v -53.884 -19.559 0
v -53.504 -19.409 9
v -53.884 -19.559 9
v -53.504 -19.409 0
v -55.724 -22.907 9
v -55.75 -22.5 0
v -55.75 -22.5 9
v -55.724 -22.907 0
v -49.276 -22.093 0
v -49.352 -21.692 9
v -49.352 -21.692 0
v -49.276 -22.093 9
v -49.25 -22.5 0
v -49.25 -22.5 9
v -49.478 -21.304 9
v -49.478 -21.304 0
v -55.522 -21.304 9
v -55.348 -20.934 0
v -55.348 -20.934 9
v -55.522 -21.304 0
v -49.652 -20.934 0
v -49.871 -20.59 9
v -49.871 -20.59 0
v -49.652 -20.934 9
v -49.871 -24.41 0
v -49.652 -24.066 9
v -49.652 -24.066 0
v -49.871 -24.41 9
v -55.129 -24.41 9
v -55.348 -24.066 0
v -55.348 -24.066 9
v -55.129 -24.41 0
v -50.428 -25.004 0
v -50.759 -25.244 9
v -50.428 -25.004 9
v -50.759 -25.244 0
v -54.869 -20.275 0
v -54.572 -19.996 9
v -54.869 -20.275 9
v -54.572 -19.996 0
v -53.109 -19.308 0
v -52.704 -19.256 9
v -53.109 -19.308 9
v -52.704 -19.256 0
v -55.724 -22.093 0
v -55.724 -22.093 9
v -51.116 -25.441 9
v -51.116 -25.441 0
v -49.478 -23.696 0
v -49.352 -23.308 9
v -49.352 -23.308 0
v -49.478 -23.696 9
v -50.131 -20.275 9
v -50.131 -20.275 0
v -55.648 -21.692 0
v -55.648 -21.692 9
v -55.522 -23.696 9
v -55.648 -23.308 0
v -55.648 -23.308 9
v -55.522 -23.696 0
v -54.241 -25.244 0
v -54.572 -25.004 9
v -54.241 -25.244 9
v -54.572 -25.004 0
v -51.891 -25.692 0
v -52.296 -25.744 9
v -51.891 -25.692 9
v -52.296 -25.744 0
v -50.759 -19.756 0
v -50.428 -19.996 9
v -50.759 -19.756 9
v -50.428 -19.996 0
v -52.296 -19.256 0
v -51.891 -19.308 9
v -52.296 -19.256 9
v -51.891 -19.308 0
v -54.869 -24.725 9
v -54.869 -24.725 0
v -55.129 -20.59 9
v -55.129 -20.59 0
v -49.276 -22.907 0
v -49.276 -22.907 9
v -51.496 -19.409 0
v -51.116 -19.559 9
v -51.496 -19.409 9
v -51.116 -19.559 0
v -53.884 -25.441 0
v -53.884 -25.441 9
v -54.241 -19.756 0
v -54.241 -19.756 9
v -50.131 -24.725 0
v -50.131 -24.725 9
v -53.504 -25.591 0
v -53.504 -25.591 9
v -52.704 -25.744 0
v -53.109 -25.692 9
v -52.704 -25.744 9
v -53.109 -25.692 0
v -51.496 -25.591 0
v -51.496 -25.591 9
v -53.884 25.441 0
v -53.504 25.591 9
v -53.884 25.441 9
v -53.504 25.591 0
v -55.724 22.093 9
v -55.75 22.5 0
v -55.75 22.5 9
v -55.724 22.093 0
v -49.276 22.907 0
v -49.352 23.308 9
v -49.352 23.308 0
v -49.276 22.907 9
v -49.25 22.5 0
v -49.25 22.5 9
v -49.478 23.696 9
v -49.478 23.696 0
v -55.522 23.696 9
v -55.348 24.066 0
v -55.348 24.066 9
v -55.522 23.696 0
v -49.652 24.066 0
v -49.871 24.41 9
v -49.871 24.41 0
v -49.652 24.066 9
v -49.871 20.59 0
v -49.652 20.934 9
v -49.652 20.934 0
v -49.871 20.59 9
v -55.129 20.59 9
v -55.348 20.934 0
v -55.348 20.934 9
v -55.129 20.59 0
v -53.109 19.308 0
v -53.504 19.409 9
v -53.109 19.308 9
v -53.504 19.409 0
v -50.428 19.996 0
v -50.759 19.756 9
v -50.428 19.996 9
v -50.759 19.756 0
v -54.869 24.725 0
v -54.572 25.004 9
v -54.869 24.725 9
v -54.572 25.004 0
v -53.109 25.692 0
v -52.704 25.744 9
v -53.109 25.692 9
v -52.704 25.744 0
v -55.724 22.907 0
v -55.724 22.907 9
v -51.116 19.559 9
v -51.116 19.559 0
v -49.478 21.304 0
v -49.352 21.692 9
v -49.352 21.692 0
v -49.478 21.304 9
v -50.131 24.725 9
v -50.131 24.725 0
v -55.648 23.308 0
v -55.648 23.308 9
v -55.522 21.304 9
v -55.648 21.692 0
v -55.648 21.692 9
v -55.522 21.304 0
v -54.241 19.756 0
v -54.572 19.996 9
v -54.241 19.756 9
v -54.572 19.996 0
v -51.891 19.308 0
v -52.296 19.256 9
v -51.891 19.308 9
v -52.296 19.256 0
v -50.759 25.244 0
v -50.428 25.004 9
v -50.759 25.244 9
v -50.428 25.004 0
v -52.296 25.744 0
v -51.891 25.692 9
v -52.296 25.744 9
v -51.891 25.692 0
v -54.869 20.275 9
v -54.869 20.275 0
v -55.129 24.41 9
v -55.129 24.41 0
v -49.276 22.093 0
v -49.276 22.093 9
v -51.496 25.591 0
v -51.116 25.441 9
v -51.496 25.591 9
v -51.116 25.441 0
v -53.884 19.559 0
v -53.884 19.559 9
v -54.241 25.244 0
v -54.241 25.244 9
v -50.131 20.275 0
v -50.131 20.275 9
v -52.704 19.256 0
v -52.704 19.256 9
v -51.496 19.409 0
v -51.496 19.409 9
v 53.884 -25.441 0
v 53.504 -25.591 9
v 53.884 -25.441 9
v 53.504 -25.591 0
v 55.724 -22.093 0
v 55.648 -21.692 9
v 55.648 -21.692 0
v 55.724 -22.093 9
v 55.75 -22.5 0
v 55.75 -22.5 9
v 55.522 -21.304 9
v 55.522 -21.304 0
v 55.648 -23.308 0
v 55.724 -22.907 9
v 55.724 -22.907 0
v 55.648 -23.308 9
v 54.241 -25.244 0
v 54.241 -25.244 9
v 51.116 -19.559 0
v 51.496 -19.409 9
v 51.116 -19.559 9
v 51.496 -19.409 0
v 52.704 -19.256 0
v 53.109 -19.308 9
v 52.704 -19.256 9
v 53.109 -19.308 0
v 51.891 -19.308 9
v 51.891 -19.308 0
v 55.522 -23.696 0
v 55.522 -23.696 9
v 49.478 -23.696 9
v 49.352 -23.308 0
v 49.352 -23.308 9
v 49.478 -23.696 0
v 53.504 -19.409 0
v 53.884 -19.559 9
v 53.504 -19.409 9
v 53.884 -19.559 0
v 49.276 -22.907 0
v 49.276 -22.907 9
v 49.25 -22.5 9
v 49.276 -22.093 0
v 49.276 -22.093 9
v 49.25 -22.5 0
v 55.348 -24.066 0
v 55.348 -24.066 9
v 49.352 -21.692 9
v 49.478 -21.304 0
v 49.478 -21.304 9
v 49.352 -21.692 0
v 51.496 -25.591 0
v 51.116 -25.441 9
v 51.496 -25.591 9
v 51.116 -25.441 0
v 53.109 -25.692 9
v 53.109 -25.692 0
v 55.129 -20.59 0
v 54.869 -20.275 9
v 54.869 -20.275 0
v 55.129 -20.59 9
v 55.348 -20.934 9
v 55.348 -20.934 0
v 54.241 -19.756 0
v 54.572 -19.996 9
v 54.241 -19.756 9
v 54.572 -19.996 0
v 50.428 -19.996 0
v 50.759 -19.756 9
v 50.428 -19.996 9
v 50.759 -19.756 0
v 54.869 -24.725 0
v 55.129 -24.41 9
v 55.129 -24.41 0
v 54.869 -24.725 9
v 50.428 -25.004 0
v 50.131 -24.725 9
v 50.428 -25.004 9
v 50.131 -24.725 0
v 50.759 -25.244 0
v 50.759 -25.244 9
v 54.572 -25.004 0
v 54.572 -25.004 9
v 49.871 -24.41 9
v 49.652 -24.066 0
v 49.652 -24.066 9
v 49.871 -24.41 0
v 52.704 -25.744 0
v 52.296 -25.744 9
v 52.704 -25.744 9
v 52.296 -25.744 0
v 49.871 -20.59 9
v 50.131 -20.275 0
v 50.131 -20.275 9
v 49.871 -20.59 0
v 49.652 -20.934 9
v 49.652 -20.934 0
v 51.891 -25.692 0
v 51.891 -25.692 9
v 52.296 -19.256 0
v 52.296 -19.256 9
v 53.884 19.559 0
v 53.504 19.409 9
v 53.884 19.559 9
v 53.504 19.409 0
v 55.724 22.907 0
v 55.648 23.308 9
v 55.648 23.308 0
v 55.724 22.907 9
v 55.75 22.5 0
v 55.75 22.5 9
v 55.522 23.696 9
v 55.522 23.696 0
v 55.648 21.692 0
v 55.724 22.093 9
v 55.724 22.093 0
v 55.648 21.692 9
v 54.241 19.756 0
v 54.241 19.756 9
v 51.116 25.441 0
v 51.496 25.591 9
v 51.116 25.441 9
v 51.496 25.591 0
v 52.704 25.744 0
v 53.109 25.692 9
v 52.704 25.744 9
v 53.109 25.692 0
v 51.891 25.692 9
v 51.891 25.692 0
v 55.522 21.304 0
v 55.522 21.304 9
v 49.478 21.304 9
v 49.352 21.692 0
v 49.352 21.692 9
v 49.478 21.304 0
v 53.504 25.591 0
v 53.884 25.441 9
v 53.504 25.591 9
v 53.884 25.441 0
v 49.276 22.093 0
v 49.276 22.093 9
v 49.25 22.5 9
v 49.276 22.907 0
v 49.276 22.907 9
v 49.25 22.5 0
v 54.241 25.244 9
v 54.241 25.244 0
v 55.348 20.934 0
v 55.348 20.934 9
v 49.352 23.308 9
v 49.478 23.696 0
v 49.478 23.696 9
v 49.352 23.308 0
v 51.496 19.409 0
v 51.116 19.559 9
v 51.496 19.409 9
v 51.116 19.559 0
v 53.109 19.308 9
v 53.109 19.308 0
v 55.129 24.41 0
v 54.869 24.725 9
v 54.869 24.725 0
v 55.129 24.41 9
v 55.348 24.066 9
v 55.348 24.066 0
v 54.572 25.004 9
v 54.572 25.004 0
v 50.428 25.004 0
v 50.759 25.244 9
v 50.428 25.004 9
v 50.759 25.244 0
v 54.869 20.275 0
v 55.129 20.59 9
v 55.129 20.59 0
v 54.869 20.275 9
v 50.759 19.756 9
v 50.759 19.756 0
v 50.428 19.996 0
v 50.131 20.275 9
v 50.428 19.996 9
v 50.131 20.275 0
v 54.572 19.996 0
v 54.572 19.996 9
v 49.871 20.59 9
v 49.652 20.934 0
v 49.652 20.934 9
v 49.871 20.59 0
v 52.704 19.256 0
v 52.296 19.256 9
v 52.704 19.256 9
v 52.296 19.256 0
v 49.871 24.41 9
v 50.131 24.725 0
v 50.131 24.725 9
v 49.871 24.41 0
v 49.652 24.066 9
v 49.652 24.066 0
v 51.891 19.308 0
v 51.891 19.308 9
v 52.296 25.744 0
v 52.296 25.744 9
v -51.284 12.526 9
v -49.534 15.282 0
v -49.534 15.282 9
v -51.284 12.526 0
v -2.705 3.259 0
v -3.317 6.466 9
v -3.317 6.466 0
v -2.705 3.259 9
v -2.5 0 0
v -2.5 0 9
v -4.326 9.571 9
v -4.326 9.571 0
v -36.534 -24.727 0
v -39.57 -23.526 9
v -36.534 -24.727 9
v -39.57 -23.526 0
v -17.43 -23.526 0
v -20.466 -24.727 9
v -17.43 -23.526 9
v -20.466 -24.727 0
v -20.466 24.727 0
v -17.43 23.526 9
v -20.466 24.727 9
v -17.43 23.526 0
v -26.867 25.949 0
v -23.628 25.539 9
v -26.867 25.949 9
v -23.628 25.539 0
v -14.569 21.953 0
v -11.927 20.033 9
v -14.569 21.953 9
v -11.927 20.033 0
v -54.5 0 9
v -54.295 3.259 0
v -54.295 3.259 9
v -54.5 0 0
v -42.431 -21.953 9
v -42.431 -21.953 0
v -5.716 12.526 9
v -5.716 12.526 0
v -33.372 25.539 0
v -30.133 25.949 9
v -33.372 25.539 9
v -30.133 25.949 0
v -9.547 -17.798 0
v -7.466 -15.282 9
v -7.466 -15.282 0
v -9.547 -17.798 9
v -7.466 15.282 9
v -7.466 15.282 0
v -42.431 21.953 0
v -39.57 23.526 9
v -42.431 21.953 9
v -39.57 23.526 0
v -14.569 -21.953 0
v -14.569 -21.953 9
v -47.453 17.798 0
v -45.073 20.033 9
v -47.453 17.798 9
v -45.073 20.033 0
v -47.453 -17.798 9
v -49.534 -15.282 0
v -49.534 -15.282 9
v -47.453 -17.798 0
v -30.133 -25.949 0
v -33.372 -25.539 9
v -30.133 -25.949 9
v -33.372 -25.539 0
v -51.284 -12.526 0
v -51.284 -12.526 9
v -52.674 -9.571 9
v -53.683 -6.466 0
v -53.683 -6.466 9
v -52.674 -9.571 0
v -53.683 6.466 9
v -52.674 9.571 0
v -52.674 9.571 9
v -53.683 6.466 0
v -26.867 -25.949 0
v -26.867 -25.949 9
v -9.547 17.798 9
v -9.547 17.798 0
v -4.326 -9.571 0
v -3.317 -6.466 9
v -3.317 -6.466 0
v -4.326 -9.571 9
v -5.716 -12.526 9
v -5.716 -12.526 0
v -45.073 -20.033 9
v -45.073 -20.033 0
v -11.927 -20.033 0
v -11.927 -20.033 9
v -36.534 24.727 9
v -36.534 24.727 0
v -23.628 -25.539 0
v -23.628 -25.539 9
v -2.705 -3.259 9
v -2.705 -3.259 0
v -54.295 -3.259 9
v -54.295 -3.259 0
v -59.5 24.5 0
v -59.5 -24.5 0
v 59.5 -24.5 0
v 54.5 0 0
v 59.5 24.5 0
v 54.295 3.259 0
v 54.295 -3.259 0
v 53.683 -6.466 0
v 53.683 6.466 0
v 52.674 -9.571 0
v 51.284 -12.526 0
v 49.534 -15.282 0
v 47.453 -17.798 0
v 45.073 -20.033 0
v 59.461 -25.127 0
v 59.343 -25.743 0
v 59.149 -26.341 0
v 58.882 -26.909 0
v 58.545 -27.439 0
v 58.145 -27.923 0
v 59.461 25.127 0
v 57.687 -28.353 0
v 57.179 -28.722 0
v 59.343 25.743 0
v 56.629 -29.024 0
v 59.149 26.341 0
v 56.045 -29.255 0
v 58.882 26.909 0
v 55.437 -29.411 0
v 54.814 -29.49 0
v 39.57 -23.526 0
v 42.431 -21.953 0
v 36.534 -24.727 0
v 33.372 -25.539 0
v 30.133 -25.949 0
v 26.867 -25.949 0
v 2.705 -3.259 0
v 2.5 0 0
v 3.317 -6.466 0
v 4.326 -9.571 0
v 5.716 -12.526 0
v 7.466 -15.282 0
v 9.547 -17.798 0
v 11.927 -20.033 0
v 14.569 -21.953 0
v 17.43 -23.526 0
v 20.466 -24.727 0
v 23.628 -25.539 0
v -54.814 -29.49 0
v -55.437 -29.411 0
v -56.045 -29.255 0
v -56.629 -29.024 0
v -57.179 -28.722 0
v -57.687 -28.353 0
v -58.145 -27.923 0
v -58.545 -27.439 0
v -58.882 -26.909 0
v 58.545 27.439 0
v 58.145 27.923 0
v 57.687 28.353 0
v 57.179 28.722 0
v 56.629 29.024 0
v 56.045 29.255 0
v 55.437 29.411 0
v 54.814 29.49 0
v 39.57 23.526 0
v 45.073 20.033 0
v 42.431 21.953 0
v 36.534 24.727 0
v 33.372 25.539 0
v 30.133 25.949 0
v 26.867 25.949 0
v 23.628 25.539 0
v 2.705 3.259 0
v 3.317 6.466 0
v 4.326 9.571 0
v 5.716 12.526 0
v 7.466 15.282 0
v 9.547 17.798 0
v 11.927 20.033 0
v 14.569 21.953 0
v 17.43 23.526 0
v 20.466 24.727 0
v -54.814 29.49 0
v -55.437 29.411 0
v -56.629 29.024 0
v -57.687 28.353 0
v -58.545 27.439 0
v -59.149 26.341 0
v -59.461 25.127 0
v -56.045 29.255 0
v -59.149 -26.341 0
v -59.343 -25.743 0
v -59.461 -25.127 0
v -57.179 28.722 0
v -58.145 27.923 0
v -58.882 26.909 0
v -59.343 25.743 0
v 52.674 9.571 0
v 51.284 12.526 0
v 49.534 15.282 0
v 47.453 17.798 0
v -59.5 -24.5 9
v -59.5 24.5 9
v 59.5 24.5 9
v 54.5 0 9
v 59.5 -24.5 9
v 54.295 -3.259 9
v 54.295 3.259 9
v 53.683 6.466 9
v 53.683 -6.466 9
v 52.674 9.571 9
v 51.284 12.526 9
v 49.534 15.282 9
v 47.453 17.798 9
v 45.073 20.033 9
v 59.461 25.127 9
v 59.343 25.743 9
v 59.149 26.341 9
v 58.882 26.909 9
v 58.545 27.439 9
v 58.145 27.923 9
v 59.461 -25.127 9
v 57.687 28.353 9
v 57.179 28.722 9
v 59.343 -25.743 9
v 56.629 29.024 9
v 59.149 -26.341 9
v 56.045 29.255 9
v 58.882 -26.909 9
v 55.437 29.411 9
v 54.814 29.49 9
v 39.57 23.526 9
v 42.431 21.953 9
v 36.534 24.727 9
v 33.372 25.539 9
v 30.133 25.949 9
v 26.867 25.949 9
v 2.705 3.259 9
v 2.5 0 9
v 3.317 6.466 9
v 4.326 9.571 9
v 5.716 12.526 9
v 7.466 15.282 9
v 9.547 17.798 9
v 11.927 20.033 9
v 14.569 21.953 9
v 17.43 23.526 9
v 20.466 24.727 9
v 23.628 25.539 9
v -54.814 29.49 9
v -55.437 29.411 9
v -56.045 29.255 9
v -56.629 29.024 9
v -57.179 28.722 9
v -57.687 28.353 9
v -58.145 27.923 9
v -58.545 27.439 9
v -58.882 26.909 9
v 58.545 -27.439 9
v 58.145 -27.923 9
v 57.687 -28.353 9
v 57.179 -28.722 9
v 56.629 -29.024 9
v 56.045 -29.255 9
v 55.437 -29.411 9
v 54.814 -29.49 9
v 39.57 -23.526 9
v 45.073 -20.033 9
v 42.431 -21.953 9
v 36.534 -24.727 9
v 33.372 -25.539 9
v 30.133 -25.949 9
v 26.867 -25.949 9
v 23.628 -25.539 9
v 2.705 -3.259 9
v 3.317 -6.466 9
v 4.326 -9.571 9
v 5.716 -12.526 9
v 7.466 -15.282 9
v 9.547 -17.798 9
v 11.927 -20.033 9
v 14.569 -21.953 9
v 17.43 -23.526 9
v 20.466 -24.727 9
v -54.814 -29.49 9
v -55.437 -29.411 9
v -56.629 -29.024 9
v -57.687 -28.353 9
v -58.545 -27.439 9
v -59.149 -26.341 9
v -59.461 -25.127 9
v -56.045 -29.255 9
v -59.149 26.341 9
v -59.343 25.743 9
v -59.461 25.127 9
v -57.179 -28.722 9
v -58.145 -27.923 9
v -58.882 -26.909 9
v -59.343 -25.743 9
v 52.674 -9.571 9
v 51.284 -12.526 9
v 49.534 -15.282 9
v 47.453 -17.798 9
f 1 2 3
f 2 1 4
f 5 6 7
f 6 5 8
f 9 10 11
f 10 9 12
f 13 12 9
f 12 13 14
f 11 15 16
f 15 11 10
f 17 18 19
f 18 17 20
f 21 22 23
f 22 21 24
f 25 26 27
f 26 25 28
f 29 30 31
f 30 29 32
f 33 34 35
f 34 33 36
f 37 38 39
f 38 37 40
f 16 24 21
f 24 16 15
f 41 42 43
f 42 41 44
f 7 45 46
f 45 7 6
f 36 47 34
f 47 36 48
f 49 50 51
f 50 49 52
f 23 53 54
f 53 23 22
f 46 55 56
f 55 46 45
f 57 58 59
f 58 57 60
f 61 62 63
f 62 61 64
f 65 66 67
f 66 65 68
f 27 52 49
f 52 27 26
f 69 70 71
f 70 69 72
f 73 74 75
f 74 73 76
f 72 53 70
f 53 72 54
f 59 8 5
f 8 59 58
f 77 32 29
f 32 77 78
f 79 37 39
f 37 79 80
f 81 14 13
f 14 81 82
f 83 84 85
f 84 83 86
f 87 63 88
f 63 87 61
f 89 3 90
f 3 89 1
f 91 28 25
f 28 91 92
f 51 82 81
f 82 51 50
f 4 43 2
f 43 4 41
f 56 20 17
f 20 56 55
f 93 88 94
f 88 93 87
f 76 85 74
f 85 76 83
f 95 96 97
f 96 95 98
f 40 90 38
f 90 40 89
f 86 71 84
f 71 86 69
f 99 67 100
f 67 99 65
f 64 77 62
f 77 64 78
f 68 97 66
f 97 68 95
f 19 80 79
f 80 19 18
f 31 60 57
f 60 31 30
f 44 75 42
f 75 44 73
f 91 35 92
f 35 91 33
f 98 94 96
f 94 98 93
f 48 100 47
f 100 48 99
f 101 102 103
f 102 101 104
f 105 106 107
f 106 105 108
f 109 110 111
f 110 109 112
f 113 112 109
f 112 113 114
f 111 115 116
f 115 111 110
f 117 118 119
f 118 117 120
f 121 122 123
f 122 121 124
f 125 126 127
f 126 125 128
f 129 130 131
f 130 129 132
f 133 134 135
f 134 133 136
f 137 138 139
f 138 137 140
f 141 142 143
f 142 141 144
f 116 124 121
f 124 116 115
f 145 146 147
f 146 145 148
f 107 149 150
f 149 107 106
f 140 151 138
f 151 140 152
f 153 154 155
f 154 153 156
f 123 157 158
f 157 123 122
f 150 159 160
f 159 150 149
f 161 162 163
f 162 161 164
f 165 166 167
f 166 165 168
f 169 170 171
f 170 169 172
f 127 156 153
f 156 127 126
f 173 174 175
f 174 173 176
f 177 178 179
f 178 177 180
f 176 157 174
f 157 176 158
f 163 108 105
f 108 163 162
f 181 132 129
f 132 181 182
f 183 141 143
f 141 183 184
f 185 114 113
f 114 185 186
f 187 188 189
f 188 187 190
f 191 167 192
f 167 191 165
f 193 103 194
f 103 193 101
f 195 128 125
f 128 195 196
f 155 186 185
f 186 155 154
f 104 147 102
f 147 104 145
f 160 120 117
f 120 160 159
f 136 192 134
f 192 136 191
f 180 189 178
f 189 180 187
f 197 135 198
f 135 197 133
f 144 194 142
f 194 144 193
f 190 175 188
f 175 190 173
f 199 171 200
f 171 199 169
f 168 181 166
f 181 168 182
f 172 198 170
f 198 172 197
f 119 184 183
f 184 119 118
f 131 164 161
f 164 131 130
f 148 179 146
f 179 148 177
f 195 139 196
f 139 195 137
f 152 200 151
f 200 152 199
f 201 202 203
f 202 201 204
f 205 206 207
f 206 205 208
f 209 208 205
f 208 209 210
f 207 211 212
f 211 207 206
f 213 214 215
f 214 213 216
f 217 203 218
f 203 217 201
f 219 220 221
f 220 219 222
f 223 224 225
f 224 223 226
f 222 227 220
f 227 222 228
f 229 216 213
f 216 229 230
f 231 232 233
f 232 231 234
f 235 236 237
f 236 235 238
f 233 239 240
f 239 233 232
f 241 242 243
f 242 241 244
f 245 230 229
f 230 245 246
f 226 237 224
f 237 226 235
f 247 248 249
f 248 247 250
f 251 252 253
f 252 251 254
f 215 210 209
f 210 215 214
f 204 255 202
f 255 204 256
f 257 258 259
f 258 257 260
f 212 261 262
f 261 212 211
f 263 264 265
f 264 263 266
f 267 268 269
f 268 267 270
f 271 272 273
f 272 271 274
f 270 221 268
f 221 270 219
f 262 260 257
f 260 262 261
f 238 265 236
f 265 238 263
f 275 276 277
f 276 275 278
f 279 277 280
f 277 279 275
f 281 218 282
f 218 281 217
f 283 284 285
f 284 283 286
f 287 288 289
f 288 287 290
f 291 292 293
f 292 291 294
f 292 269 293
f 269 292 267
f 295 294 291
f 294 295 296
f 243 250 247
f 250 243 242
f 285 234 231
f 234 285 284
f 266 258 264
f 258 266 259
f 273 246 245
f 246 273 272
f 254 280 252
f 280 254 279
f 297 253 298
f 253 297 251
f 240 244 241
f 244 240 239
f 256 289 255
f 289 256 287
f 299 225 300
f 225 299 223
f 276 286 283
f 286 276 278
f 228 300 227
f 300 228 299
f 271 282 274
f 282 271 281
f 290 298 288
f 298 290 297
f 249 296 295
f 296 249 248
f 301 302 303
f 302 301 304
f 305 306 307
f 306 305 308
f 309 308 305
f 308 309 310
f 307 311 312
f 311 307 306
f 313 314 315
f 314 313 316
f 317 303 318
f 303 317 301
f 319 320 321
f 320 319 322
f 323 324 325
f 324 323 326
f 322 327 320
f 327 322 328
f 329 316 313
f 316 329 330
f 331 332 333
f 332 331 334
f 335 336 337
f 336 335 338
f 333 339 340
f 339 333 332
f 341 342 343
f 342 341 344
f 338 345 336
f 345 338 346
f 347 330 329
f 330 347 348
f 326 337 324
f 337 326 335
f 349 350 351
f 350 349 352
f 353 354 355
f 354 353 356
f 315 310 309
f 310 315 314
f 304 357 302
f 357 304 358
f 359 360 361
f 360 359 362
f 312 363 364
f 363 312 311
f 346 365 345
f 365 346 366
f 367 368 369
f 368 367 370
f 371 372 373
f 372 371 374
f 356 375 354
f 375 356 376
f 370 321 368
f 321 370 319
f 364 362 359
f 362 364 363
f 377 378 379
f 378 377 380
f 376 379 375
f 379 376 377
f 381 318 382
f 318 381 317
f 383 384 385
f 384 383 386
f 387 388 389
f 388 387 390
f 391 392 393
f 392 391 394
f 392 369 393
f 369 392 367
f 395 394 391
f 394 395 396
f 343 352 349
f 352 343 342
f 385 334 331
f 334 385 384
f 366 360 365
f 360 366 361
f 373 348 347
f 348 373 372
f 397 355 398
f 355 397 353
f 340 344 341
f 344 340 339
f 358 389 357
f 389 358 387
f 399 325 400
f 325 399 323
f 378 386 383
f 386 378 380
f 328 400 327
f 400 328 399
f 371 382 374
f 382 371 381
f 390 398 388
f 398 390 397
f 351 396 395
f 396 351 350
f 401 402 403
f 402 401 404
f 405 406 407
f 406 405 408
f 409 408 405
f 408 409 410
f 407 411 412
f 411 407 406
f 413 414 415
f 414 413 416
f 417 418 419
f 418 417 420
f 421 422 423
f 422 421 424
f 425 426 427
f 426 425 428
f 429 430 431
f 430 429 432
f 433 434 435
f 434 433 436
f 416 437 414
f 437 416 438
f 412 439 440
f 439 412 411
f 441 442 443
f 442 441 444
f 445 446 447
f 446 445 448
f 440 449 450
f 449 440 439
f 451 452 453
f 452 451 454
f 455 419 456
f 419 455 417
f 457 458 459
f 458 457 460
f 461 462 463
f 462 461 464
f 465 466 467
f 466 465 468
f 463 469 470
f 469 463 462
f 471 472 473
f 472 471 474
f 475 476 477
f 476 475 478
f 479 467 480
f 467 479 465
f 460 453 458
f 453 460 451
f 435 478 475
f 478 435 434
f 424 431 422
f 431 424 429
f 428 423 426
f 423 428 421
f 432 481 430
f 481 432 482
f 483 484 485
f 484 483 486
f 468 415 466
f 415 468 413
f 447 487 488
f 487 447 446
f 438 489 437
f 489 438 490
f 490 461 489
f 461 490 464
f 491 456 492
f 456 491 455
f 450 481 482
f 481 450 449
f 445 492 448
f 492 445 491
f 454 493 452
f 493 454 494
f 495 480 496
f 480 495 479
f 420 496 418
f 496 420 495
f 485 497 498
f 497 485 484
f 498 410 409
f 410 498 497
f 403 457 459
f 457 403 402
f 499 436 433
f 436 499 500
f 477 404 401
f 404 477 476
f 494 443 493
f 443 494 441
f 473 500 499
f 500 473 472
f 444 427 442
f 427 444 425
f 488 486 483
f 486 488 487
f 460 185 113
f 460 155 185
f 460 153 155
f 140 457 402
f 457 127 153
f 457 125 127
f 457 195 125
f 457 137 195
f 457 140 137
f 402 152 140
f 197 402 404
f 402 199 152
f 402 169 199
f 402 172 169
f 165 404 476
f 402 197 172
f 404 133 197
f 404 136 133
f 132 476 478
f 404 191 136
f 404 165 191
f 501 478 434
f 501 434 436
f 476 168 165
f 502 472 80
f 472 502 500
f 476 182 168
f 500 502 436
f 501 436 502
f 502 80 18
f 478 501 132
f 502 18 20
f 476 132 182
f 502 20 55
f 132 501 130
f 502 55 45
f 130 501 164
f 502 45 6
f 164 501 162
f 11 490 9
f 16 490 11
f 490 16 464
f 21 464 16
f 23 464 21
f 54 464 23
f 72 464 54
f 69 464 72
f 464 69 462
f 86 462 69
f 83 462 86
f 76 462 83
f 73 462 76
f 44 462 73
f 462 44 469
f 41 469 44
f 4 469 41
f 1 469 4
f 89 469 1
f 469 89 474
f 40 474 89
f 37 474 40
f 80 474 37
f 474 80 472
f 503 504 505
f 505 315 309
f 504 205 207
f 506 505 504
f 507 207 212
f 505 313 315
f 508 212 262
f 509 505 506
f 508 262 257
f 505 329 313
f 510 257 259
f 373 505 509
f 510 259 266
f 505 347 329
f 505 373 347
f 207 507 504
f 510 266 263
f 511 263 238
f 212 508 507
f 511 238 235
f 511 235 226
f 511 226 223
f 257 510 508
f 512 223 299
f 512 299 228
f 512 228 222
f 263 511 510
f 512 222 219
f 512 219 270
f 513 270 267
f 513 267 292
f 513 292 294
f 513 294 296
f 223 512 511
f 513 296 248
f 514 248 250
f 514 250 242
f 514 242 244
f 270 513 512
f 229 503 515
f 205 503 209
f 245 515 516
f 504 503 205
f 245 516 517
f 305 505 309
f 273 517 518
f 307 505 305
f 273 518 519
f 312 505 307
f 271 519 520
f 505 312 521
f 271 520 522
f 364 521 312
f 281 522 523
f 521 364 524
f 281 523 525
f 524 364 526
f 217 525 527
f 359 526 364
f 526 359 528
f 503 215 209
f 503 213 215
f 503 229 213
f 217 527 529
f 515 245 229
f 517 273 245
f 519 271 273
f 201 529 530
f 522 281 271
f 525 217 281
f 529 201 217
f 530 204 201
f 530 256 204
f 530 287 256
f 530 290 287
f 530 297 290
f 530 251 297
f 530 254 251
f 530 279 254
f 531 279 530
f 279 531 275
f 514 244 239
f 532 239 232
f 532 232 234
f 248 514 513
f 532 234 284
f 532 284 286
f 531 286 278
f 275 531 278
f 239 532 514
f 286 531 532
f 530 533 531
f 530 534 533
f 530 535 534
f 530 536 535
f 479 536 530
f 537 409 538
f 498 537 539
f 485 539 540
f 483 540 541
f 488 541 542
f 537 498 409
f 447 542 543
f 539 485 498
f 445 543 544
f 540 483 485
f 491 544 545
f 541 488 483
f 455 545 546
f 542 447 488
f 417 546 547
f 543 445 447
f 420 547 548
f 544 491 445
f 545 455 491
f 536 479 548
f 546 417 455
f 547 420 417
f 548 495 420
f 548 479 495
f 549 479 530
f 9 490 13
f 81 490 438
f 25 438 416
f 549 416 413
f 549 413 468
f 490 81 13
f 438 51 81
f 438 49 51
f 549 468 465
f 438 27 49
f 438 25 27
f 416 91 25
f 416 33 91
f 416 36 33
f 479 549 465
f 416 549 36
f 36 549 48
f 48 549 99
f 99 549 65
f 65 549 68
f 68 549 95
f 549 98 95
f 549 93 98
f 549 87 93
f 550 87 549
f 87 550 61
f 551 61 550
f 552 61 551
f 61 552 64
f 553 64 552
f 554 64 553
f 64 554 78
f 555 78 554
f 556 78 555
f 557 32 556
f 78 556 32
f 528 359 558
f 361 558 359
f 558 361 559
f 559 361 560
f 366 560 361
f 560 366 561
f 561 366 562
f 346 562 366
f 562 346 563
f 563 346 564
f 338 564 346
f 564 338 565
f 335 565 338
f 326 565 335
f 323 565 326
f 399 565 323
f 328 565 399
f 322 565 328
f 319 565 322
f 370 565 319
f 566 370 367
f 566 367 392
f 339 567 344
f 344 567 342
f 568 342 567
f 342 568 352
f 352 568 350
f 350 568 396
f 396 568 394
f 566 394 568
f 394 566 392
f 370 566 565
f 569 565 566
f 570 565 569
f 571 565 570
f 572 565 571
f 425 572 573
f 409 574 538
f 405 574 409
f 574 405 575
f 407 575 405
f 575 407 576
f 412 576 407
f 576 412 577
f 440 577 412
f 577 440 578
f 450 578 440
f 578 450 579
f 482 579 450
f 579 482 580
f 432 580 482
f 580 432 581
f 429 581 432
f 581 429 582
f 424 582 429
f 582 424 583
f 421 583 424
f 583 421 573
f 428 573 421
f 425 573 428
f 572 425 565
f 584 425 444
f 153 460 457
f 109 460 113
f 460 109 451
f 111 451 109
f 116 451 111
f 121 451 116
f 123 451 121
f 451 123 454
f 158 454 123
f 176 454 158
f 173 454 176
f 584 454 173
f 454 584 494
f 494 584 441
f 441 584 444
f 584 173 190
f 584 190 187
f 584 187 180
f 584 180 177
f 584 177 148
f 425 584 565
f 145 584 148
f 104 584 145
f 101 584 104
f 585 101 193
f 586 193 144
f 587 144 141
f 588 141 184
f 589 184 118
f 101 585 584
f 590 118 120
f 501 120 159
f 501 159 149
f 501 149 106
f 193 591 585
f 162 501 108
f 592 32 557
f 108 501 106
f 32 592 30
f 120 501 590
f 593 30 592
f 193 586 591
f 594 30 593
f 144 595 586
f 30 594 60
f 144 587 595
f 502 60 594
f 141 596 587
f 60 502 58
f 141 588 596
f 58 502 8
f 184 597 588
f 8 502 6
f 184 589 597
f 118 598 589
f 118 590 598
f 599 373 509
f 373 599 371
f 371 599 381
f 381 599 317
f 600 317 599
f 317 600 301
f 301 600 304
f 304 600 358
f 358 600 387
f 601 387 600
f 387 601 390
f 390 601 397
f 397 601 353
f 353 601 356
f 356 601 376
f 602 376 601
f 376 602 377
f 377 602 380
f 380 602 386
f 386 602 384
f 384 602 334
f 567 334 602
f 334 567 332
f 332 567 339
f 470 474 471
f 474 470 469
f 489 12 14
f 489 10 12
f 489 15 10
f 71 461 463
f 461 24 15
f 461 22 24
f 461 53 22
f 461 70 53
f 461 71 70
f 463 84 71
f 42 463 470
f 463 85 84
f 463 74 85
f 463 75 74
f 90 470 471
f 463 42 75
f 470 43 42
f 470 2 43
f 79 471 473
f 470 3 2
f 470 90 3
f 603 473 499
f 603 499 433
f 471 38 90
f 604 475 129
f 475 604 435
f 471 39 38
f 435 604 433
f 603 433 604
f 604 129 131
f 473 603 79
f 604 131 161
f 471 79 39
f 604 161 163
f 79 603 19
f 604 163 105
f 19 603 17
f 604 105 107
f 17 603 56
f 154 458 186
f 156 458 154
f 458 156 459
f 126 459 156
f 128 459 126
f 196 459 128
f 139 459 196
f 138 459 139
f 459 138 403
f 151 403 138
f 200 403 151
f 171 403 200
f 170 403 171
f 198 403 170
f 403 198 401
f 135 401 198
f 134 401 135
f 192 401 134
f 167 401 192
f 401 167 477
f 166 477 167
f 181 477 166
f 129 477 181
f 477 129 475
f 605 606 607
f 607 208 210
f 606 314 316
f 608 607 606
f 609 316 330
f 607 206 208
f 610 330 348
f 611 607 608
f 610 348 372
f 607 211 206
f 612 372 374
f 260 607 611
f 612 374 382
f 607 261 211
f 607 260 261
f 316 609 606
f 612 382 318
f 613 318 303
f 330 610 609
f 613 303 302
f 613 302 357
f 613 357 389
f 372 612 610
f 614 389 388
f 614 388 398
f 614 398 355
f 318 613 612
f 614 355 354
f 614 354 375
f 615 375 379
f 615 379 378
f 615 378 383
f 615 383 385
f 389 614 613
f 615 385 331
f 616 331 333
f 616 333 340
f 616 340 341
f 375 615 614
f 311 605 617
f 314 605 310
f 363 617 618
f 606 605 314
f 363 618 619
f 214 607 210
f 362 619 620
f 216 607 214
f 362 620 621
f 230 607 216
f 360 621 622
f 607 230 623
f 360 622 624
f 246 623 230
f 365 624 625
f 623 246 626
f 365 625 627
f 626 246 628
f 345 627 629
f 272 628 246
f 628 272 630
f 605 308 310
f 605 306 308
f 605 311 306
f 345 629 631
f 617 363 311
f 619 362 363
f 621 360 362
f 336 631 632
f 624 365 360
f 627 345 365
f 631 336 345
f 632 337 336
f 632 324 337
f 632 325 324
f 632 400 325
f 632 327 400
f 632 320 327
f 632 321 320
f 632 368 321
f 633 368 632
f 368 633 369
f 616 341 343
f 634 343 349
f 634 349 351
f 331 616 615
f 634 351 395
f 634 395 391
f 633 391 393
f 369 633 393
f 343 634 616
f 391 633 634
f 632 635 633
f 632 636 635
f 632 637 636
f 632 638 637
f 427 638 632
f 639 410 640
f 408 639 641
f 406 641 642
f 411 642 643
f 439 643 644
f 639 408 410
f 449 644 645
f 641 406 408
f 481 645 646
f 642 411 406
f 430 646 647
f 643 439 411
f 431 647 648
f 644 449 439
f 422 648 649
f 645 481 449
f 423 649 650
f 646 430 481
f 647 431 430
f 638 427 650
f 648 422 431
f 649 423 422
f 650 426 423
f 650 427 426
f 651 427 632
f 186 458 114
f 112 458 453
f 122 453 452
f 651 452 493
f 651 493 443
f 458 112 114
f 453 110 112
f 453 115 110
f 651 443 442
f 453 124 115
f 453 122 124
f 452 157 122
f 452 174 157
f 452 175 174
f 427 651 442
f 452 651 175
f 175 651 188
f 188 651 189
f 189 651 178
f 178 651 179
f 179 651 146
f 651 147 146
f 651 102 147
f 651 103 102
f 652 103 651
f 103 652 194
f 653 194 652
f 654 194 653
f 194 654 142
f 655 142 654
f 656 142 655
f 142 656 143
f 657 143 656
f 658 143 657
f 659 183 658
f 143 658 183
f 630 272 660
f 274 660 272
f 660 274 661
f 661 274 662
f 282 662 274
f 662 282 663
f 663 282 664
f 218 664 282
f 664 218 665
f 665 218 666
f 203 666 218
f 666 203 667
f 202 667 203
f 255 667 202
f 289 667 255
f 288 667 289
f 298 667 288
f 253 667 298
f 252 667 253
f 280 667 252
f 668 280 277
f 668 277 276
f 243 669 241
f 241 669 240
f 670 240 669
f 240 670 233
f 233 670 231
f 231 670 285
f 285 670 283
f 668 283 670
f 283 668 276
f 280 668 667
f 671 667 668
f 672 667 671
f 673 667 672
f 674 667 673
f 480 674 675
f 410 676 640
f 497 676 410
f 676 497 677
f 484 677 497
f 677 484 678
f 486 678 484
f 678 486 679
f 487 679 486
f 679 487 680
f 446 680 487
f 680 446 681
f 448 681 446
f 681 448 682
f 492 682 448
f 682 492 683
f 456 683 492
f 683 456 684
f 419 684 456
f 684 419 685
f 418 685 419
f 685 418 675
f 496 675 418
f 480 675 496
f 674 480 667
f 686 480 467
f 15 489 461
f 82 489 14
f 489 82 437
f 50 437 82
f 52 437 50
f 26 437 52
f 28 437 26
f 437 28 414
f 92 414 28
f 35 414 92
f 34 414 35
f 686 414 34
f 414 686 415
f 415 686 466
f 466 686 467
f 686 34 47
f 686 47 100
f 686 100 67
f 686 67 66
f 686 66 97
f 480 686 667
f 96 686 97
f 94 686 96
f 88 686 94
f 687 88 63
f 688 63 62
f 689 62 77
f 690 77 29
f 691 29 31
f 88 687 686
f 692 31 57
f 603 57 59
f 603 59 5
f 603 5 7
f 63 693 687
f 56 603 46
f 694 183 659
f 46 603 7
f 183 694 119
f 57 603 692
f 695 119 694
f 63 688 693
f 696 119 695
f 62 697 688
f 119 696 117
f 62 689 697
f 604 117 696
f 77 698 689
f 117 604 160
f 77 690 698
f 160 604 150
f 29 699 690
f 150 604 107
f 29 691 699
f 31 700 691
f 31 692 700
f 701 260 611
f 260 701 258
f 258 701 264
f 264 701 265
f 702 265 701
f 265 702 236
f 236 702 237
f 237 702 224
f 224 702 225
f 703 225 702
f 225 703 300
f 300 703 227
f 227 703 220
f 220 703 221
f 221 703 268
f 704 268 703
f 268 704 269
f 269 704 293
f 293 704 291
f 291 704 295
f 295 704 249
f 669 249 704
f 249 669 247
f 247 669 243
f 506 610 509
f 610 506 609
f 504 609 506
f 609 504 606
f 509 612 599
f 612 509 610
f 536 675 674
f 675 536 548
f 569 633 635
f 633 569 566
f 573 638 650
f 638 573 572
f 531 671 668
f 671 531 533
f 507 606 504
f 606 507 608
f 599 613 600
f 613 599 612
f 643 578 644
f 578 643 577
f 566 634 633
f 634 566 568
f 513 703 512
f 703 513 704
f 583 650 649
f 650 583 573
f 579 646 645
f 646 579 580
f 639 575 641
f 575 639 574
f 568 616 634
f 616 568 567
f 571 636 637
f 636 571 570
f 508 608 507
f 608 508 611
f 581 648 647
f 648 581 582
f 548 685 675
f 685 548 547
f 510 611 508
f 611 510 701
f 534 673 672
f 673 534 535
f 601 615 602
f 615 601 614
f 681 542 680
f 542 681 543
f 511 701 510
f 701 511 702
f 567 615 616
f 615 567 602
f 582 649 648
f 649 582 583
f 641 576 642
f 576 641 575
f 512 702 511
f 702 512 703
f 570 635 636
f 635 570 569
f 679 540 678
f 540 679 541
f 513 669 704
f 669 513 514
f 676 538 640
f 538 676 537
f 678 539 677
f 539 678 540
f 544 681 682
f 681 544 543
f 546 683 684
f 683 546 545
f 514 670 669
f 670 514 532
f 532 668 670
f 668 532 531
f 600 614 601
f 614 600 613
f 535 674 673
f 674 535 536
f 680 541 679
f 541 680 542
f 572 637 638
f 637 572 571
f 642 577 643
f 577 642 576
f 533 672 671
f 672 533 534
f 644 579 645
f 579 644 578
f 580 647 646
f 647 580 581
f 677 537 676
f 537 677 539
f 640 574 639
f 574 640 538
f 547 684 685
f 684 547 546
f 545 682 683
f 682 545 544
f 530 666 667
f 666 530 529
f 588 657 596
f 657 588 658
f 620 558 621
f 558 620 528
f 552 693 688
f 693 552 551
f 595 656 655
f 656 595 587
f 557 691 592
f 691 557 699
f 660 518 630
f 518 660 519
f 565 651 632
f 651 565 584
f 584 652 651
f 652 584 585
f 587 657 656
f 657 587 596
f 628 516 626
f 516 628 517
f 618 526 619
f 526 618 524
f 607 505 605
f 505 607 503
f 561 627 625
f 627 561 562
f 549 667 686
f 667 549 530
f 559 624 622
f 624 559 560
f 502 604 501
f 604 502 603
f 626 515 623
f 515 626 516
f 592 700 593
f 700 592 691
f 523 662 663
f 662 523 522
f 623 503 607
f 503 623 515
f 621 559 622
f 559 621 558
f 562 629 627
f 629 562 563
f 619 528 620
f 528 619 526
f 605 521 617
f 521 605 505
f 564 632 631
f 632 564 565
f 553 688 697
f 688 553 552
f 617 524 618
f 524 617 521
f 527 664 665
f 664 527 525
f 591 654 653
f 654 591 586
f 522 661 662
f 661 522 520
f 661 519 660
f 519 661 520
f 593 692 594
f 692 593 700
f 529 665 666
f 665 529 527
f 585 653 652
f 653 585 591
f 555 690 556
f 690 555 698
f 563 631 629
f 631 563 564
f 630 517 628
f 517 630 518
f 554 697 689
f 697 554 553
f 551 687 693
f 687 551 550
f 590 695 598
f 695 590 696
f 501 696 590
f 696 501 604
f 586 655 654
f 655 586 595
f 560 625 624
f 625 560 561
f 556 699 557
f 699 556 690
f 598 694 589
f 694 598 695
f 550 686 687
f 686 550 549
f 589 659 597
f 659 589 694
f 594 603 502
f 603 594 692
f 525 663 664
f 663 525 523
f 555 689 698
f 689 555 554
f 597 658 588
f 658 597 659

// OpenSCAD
$fn = 50;


difference() {
	union() {
		hull() {
			translate(v = [-54.5000000000, 24.5000000000, 0]) {
				cylinder(h = 9, r = 5);
			}
			translate(v = [54.5000000000, 24.5000000000, 0]) {
				cylinder(h = 9, r = 5);
			}
			translate(v = [-54.5000000000, -24.5000000000, 0]) {
				cylinder(h = 9, r = 5);
			}
			translate(v = [54.5000000000, -24.5000000000, 0]) {
				cylinder(h = 9, r = 5);
			}
		}
	}
	union() {
		#translate(v = [-52.5000000000, -22.5000000000, -100.0000000000]) {
			cylinder(h = 200, r = 3.2500000000);
		}
		#translate(v = [-52.5000000000, 22.5000000000, -100.0000000000]) {
			cylinder(h = 200, r = 3.2500000000);
		}
		#translate(v = [52.5000000000, -22.5000000000, -100.0000000000]) {
			cylinder(h = 200, r = 3.2500000000);
		}
		#translate(v = [52.5000000000, 22.5000000000, -100.0000000000]) {
			cylinder(h = 200, r = 3.2500000000);
		}
		#translate(v = [-28.5000000000, 0, 0]) {
			cylinder(h = 9, r = 26.0000000000);
		}
		#translate(v = [28.5000000000, 0, 0]) {
			cylinder(h = 9, r = 26.0000000000);
		}
	}
}
